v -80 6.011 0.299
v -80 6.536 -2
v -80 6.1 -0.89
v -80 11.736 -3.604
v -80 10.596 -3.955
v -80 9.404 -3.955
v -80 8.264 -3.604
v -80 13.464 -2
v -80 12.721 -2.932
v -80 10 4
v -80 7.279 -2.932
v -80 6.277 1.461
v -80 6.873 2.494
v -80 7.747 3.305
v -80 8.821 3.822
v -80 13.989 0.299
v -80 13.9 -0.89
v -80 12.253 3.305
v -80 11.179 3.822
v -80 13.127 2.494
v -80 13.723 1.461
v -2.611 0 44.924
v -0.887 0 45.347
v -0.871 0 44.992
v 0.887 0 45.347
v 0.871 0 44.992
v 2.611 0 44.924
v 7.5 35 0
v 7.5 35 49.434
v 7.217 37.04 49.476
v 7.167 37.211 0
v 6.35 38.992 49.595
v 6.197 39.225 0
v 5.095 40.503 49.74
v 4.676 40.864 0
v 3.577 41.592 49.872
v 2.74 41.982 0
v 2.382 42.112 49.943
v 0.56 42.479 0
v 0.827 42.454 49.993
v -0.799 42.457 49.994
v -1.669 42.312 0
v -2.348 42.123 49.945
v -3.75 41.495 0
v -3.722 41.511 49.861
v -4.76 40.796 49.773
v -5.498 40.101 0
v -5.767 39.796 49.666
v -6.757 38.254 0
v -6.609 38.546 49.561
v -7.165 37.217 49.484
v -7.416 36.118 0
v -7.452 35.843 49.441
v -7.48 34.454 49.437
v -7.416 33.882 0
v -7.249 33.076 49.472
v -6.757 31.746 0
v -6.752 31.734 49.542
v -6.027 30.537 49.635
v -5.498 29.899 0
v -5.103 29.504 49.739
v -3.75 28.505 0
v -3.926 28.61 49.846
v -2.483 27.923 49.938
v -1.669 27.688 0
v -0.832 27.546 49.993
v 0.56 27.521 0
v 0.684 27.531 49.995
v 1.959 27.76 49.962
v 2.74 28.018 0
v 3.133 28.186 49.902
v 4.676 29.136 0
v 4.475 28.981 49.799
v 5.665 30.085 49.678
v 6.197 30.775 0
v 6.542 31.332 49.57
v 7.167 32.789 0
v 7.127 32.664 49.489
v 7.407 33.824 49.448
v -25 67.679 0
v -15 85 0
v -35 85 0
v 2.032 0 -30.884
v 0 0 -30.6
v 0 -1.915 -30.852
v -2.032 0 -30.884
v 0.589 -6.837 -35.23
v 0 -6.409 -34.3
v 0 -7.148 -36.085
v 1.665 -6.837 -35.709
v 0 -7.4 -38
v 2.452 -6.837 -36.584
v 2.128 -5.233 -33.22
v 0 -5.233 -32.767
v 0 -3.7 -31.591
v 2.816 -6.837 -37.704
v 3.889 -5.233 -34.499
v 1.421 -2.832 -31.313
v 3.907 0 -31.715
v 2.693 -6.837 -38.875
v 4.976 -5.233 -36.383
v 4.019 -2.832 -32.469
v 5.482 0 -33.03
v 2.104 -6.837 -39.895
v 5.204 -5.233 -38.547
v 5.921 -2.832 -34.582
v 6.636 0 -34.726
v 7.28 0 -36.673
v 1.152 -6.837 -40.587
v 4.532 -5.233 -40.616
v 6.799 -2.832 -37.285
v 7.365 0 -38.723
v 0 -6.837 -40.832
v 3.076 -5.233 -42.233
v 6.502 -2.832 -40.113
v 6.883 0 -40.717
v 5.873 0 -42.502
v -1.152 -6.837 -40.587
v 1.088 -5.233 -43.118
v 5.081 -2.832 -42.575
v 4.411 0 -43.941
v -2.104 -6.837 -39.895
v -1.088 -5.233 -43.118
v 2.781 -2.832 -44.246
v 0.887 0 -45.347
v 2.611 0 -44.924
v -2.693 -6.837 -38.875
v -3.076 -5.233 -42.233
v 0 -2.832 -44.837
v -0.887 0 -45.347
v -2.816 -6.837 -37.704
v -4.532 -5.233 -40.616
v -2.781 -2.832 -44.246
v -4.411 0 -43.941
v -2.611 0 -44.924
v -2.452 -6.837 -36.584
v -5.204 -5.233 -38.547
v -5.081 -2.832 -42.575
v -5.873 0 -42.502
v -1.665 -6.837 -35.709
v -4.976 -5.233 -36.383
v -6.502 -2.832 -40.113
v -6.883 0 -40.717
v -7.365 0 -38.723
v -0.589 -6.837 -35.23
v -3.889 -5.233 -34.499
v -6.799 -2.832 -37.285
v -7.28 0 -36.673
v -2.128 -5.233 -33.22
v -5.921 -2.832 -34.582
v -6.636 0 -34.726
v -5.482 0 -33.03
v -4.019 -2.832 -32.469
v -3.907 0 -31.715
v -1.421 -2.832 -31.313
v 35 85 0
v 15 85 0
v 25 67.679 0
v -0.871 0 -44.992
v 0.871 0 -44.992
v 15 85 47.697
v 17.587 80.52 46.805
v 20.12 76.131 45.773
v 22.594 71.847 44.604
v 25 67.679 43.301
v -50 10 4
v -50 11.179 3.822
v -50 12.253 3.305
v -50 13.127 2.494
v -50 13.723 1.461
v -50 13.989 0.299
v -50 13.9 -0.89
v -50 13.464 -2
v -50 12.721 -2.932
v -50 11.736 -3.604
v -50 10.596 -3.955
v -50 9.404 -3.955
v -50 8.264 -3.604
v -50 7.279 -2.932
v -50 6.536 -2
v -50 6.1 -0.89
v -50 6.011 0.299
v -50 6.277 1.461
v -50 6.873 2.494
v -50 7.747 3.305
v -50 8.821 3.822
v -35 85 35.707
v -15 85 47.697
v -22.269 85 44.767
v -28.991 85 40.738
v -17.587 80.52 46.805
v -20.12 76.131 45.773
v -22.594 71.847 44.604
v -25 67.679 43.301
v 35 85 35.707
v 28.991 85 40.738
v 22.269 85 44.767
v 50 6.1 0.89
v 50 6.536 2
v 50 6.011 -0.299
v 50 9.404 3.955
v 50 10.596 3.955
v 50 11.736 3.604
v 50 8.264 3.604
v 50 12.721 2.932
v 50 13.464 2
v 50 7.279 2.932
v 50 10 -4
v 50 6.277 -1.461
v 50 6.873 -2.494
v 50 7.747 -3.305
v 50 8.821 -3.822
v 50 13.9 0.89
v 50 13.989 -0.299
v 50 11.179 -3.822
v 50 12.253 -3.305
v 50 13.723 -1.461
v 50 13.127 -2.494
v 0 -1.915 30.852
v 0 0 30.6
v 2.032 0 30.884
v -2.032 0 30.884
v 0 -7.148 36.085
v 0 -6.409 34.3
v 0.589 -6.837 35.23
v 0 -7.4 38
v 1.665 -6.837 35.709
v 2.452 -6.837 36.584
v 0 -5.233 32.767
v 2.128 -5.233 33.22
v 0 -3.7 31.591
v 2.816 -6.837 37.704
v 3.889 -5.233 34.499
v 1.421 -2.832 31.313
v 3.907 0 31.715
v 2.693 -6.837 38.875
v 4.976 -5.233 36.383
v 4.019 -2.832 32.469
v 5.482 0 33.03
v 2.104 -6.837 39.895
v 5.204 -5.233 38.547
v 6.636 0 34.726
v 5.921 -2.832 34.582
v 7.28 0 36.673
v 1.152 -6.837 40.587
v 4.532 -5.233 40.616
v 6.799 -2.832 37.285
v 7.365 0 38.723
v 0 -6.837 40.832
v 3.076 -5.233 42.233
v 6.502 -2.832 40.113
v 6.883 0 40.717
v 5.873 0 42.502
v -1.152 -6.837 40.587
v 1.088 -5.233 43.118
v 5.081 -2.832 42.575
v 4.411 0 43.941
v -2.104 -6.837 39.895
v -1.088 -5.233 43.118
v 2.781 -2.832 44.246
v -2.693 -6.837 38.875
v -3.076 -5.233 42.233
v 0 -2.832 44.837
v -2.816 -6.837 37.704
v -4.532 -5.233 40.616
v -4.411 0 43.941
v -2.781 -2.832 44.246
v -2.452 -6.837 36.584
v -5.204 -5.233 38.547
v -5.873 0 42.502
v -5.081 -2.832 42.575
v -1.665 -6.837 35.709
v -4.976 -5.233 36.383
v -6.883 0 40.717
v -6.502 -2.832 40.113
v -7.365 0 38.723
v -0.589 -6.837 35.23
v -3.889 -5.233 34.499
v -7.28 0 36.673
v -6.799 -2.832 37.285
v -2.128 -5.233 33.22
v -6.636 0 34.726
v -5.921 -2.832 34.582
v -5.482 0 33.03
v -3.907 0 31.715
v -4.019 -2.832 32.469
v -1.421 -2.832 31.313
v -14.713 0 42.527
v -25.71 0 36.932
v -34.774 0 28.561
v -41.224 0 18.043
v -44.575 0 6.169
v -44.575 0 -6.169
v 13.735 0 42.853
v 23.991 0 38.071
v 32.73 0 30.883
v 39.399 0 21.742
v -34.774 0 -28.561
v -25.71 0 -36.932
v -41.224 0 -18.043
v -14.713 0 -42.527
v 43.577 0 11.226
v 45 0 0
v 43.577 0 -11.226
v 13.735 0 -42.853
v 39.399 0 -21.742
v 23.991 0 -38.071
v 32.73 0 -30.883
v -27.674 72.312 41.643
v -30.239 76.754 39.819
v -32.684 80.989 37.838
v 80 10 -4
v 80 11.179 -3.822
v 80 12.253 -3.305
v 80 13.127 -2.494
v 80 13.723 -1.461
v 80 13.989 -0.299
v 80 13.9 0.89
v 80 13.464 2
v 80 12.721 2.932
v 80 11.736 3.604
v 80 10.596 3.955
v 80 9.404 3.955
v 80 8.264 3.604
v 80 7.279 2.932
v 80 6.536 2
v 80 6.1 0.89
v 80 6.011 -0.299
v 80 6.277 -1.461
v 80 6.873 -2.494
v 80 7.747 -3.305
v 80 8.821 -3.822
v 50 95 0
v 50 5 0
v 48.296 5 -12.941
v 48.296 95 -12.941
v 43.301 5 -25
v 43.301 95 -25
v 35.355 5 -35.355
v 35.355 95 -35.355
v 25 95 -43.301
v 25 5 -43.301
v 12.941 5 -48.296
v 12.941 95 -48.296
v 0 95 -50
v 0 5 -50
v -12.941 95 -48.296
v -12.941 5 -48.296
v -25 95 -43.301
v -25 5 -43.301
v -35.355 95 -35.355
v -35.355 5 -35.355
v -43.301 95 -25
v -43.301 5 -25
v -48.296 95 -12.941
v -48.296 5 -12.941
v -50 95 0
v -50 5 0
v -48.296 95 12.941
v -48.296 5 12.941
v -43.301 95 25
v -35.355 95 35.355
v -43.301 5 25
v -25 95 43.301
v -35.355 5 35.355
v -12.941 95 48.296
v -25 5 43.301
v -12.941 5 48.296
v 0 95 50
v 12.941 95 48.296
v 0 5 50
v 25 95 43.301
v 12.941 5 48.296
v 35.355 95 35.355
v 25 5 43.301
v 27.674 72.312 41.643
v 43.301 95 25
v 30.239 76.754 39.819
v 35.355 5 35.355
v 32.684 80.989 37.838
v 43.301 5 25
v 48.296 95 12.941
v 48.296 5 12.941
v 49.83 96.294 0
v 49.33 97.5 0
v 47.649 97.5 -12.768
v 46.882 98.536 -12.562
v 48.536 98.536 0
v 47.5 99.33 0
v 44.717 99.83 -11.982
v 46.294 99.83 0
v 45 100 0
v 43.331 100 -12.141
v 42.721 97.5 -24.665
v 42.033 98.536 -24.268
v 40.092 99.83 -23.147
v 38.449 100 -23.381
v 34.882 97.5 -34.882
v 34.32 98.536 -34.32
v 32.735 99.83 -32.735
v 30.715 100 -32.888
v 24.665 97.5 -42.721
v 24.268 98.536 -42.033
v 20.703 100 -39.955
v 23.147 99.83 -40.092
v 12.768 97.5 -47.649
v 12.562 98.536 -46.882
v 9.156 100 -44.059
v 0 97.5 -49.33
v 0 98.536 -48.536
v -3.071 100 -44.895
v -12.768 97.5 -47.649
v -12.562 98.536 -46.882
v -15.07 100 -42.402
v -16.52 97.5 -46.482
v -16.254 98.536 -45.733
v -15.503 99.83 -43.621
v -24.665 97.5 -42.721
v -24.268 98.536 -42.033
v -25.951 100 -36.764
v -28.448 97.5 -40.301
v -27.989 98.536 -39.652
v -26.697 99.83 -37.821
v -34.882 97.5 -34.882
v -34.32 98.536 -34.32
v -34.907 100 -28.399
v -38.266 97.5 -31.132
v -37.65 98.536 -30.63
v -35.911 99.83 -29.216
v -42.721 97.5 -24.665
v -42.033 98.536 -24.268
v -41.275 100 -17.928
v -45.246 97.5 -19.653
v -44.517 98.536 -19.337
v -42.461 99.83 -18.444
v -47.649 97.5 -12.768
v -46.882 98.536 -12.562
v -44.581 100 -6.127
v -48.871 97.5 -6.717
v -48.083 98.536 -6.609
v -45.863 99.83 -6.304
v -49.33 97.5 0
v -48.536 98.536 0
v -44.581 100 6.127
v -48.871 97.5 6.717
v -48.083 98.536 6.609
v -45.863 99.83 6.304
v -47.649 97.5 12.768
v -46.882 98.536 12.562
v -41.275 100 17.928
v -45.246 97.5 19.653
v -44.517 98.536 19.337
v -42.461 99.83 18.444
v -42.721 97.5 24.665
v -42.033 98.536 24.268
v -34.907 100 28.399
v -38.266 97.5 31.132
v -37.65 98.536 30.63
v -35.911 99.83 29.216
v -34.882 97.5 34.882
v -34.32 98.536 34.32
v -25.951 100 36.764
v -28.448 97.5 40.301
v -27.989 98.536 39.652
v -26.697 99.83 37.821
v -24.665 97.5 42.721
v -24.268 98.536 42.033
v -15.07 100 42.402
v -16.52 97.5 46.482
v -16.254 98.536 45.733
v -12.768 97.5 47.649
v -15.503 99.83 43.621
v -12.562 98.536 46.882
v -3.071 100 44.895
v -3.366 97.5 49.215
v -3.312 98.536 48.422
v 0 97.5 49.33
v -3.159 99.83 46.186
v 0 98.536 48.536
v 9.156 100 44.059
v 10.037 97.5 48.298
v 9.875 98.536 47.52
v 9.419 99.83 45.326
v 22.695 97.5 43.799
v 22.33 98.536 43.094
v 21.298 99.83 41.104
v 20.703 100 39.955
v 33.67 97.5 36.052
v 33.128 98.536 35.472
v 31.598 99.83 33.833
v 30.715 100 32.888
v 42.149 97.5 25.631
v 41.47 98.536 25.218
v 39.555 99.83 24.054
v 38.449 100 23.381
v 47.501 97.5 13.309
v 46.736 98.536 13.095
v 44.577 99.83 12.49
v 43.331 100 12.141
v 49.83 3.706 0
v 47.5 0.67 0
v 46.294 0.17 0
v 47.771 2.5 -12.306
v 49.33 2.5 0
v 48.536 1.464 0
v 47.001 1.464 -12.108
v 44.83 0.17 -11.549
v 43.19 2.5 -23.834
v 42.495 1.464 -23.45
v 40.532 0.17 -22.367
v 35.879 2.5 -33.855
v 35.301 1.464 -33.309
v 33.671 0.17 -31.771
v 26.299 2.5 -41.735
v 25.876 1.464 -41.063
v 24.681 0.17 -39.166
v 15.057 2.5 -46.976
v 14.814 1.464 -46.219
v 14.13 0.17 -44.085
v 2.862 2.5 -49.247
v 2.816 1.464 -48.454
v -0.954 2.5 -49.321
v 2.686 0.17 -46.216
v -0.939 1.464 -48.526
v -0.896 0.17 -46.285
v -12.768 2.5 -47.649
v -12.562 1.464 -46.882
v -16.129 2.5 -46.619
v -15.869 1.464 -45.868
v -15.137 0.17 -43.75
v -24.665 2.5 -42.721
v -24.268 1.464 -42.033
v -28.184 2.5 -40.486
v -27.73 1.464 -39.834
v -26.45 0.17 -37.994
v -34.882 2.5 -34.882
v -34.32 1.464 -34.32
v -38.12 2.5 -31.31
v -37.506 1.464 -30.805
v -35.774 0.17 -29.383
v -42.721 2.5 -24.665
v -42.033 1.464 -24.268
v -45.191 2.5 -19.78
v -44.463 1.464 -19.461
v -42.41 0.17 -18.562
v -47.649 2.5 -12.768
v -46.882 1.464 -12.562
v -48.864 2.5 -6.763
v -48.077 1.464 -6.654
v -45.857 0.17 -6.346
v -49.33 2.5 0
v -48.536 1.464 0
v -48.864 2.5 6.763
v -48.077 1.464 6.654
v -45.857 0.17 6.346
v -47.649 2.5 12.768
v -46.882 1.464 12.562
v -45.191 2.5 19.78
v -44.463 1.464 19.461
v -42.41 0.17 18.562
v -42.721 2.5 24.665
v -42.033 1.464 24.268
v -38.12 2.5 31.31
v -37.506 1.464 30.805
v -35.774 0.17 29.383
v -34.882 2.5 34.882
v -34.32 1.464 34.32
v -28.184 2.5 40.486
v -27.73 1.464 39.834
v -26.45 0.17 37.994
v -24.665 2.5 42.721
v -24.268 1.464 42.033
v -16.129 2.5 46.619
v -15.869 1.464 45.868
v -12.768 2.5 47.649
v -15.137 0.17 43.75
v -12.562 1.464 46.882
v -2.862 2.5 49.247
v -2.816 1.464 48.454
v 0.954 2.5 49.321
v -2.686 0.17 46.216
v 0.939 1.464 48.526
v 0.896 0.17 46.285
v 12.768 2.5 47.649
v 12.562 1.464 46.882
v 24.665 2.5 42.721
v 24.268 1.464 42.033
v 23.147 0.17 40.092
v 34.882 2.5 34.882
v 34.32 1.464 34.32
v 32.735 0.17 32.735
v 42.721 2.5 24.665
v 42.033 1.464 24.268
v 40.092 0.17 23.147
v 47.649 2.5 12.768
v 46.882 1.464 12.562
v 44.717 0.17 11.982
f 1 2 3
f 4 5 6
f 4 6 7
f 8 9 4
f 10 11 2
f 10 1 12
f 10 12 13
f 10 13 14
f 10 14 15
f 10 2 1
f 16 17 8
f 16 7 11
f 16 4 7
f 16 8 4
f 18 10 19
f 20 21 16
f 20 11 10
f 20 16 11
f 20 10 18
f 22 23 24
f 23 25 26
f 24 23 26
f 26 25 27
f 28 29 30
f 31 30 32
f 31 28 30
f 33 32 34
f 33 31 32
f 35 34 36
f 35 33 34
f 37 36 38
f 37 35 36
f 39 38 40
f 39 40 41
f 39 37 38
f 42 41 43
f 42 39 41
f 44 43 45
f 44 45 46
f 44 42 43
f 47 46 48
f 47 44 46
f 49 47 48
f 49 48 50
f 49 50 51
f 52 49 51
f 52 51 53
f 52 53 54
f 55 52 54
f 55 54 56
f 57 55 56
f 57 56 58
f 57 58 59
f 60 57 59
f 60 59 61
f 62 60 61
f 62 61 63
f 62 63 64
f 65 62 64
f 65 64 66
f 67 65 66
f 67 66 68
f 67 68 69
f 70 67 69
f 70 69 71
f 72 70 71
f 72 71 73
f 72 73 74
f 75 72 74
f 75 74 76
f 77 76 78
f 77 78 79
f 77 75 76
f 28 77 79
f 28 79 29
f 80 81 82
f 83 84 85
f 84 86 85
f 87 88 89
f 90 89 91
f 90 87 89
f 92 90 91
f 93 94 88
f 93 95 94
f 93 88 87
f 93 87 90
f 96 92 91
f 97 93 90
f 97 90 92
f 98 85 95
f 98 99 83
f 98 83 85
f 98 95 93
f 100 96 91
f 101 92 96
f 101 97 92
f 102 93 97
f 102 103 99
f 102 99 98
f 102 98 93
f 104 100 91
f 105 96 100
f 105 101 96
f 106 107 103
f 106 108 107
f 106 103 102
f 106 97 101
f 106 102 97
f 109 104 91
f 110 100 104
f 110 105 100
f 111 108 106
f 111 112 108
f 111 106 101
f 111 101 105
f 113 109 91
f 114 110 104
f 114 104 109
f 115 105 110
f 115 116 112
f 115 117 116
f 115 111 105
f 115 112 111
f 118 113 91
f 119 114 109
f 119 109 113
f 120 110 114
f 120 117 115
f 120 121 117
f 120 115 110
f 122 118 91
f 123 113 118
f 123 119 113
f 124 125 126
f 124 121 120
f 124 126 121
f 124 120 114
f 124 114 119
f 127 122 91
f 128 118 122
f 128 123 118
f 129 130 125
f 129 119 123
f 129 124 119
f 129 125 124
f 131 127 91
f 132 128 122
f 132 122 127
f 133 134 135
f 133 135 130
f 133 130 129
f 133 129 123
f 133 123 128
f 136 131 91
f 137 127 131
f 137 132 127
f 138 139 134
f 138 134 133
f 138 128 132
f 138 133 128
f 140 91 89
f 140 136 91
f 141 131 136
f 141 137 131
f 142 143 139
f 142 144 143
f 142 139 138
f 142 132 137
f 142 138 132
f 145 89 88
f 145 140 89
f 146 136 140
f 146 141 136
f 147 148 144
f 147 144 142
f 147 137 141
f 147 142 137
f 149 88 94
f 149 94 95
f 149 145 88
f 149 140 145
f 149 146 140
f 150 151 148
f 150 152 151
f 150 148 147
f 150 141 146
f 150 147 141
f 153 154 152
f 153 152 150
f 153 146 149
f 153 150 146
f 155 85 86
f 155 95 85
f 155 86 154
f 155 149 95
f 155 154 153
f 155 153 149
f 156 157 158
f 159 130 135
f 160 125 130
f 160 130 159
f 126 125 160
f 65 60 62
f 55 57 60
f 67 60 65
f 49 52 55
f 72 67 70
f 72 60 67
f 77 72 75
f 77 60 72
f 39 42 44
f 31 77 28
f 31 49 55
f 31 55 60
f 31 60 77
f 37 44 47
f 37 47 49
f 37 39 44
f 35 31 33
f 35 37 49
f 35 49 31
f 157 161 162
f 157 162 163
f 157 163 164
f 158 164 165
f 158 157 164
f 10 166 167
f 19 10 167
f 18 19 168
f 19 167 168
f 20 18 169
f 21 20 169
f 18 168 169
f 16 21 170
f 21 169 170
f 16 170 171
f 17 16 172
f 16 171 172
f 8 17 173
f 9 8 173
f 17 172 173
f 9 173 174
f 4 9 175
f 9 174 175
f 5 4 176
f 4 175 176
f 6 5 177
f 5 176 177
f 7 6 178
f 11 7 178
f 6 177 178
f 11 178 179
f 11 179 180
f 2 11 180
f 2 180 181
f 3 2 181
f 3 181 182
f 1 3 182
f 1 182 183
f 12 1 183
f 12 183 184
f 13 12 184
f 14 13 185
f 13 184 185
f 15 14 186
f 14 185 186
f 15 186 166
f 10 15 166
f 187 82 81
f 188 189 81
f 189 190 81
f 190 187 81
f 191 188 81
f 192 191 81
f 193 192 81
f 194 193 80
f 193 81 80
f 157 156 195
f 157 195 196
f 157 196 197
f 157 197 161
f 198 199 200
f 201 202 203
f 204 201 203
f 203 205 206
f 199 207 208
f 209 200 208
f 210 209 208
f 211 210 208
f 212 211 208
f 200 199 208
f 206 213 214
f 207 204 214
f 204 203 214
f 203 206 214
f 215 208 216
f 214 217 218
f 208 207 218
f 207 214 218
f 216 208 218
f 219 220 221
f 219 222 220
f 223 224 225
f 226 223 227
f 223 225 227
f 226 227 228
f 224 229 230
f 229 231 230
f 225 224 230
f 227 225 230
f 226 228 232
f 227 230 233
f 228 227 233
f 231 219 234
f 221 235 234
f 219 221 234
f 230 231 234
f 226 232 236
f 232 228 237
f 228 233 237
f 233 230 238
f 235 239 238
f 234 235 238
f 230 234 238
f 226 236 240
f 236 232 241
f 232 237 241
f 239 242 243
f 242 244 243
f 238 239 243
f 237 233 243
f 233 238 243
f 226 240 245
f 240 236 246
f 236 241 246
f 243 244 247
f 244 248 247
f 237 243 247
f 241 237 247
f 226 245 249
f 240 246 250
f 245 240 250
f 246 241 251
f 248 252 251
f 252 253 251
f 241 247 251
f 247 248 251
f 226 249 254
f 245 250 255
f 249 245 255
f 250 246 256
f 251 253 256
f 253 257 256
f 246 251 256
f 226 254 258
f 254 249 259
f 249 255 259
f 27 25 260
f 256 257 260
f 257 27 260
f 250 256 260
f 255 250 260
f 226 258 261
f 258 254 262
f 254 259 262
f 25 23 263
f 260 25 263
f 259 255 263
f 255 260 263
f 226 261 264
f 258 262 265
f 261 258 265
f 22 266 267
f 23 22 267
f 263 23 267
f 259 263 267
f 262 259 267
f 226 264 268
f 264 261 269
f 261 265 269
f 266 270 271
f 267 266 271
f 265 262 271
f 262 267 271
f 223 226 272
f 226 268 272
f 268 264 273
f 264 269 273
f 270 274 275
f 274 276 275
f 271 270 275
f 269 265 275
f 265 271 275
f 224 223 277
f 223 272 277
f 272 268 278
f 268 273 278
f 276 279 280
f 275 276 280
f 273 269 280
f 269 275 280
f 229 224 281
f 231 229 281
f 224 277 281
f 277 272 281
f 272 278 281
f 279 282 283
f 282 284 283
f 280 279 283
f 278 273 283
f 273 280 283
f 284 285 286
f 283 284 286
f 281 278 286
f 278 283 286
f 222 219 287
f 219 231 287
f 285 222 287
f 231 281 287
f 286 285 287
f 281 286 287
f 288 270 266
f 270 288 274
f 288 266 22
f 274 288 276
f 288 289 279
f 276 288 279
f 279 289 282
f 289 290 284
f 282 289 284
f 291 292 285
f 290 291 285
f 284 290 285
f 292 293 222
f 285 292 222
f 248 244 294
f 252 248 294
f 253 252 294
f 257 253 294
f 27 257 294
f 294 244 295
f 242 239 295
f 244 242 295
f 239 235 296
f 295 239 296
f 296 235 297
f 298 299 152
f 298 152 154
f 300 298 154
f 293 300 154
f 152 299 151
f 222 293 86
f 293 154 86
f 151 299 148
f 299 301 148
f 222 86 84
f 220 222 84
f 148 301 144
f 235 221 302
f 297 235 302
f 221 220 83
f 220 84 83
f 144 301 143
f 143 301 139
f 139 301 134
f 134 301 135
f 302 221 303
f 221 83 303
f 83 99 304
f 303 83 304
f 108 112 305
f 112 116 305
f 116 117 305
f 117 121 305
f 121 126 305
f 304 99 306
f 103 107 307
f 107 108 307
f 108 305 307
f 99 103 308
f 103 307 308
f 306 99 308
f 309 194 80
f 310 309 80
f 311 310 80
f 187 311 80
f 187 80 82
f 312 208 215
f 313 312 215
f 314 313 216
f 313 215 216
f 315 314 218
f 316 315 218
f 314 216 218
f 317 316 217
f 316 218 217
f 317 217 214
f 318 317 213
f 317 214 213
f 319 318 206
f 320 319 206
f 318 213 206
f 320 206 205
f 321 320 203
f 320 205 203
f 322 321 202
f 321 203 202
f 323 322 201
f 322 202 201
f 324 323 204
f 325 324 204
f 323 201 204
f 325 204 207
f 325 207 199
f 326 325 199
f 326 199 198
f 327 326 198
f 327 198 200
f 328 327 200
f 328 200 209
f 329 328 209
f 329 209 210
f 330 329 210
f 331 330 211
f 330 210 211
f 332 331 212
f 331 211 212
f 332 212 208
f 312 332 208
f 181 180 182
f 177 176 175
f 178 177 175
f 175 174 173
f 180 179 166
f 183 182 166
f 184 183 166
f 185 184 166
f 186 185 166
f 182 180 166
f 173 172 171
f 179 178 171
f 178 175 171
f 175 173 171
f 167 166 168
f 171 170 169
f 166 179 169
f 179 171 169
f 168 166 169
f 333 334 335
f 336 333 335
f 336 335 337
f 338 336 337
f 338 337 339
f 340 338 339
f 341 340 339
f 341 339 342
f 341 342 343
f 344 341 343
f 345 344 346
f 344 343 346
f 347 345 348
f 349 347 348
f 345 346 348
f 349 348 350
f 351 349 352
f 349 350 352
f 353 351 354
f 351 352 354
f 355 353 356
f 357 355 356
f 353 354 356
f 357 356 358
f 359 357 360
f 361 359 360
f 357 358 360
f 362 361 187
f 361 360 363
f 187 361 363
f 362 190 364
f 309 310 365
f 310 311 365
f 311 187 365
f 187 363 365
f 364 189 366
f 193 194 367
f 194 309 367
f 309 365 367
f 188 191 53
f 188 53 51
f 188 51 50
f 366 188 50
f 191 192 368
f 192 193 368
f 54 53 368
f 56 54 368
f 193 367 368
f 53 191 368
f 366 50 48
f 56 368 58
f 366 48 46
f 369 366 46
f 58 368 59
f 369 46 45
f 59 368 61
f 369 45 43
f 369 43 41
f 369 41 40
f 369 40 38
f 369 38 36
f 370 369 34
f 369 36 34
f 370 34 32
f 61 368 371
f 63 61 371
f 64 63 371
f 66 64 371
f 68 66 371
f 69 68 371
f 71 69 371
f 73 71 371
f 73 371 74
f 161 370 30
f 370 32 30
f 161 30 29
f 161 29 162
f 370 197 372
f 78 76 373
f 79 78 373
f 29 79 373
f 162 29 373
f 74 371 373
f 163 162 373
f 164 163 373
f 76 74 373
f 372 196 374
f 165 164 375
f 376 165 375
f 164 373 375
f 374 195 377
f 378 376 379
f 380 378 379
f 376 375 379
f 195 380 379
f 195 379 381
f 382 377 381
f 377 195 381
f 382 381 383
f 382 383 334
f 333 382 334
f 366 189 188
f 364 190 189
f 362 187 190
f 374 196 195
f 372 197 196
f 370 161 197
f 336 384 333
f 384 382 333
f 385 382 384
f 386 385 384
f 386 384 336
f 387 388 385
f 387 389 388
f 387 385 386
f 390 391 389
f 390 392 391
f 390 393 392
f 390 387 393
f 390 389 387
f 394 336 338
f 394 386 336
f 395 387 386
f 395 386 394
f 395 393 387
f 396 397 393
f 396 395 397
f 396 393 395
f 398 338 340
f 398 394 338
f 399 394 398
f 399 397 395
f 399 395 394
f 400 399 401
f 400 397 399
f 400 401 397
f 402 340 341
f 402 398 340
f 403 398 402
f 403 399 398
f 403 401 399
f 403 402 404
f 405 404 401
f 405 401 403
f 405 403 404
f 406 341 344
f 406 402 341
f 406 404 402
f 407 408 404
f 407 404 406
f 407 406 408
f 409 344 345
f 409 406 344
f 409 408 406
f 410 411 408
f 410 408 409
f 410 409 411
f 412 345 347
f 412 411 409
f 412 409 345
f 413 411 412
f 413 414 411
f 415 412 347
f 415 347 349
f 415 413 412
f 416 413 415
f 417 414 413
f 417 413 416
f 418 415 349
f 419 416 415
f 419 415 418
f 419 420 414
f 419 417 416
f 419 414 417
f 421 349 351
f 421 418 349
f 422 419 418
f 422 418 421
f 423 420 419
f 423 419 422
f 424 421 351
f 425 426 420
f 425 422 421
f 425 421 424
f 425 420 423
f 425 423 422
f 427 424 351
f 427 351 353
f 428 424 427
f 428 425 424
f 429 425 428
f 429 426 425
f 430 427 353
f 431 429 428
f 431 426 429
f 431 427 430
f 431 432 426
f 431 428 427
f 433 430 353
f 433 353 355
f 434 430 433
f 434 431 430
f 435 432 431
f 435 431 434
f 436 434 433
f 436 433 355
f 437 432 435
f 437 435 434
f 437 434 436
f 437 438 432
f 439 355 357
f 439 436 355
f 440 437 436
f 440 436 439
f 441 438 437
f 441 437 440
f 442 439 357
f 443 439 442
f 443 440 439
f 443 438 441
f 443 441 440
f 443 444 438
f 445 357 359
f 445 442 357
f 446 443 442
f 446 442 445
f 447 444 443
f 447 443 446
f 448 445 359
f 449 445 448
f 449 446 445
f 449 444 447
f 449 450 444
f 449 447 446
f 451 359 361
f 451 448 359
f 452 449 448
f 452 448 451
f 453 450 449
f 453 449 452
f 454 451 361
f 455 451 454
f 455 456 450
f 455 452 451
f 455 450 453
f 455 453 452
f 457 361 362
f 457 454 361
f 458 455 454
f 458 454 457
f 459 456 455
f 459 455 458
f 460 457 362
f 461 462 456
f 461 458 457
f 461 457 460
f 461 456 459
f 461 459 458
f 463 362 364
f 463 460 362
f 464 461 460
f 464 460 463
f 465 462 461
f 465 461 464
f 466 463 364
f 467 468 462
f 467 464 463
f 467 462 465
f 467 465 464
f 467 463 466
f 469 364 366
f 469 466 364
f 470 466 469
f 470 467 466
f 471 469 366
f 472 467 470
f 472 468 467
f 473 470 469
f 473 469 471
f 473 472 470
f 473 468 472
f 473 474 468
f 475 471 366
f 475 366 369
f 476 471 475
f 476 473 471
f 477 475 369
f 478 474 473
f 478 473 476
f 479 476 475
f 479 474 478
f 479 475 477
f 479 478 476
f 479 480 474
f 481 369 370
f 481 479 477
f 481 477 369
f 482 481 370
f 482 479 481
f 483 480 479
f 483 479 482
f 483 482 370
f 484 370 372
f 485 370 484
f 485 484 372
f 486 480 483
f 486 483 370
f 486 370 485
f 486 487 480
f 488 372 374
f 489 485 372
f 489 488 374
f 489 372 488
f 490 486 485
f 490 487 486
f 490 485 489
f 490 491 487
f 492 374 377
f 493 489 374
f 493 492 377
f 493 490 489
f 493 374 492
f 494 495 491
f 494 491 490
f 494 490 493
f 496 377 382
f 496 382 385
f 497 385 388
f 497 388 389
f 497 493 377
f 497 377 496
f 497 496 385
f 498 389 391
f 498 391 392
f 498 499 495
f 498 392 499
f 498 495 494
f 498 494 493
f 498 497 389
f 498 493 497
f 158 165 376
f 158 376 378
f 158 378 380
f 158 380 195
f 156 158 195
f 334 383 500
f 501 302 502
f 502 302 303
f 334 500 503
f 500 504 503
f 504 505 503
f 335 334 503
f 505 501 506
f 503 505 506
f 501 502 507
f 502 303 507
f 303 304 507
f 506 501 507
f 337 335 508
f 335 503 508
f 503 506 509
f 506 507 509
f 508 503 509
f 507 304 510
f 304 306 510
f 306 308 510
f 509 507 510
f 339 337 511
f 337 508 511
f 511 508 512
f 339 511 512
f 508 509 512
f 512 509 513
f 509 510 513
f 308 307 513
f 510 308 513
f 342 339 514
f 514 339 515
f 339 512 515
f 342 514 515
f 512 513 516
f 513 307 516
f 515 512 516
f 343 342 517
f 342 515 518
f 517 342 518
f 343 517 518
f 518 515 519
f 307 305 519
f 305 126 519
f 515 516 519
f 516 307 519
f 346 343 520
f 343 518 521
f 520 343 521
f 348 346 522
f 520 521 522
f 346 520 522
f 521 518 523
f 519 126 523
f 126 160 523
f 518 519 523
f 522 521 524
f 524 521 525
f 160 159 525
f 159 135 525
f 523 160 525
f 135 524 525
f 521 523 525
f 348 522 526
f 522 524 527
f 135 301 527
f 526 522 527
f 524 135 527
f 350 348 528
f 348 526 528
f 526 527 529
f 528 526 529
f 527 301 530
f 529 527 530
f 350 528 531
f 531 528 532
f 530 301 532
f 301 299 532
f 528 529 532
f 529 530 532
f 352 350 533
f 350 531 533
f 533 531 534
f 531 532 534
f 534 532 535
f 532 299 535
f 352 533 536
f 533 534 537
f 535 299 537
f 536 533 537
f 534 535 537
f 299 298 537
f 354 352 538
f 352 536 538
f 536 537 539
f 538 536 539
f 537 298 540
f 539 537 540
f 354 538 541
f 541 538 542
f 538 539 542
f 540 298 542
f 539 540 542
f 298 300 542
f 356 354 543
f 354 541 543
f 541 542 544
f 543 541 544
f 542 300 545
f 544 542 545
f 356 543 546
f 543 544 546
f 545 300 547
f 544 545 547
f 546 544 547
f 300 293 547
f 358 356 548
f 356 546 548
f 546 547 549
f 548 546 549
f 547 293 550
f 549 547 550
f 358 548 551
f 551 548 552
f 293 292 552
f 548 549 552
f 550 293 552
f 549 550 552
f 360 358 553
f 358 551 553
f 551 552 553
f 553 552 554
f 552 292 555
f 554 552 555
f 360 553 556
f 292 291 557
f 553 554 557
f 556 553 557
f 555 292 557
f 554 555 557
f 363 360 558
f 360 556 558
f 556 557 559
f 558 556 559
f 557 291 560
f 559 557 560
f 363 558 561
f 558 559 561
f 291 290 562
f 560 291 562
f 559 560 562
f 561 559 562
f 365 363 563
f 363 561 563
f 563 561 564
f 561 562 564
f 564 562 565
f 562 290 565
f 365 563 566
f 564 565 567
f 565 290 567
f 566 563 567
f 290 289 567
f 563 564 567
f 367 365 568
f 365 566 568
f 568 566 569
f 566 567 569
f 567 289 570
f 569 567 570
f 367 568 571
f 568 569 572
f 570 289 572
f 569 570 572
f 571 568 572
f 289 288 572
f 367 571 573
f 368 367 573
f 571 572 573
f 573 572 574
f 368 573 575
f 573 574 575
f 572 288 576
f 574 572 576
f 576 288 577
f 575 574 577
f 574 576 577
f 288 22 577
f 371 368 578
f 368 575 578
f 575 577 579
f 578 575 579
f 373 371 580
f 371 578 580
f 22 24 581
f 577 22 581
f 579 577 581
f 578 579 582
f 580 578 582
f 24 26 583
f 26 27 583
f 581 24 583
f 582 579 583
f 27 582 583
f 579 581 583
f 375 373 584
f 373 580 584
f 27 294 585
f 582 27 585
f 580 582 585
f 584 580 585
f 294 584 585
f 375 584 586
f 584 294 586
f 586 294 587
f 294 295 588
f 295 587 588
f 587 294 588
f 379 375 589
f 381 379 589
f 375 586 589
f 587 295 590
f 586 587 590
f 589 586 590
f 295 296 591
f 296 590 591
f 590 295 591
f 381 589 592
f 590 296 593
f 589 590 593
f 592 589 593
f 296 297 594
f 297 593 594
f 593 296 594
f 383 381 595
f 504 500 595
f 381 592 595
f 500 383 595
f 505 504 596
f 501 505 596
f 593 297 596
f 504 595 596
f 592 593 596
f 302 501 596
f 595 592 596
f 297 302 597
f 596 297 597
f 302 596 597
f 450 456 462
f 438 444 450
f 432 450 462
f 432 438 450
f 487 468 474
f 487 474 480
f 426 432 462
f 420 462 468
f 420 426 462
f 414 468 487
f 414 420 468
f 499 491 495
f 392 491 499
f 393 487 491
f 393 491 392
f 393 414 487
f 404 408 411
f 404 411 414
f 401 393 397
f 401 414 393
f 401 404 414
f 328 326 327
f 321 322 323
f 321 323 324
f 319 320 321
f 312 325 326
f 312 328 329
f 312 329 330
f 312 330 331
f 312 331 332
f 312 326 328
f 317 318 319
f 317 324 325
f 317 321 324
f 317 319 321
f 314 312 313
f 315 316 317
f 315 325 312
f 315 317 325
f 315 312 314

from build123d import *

# Parameters (mm, degrees)
ESQUISSE1_R             = 50
BOSS_EXTRU_1_DEPTH      = 100
ESQUISSE2_R             = 4
BOSS_EXTRU_2_DEPTH      = 30
ESQUISSE3_R             = 4
BOSS_EXTRU_3_DEPTH      = 30
CONG_1_R                = 5
ESQUISSE6_R             = 7.5
ENL_V_MAT_EXTRU_1_DEPTH = 65


with BuildPart() as part:
    # Esquisse1 → Boss.-Extru.1 (new body)
    with BuildSketch(Plane(origin=(0, 0, 0), x_dir=(1, 0, 0), z_dir=(0, 1, 0))):
        Circle(ESQUISSE1_R)
    extrude(amount=BOSS_EXTRU_1_DEPTH)

    # Congé1
    cong_1_edges = [part.edges().sort_by_distance(p)[0] for p in [
        (-50, 0, 0),
        (-50, 100, 0),
    ]]
    fillet(cong_1_edges, radius=CONG_1_R)

    # Esquisse5 → Révolution1 (revolve)
    with BuildSketch(Plane(origin=(0, 0, 0), x_dir=(0, 0, -1), z_dir=(1, 0, 0))):
        with BuildLine():
            Line((-38, 0), (-38, -7.4))
            ThreePointArc((-38, -7.4), (-32.767409819, -5.232590181), (-30.6, 0))
            Line((-30.6, 0), (-38, 0))
        make_face()
    r_volution1 = revolve(axis=Axis((0, 0, 38), (0, -1, 0)))

    # Symétrie4: Révolution1 across plane
    add(r_volution1.mirror(Plane.XY))

    # Esquisse6 → Enlèv. mat.-Extru.1 (cut)
    with BuildSketch(Plane.XY):
        with Locations((0, 35)):
            Circle(ESQUISSE6_R)
        Polygon((-35, 85), (-15, 85), (-25, 67.679491924), align=None)
        Polygon((25, 67.679491924), (35, 85), (15, 85), align=None)
    extrude(amount=ENL_V_MAT_EXTRU_1_DEPTH, mode=Mode.SUBTRACT)


with BuildPart() as body_2:
    # Esquisse2 → Boss.-Extru.2 (new body)
    with BuildSketch(Plane(origin=(50, 0, 0), x_dir=(0, 0, -1), z_dir=(1, 0, 0))):
        with Locations((0, 10)):
            Circle(ESQUISSE2_R)
    extrude(amount=BOSS_EXTRU_2_DEPTH)


with BuildPart() as body_3:
    # Esquisse3 → Boss.-Extru.3 (new body)
    with BuildSketch(Plane.ZY.offset(50)):
        with Locations((0, 10)):
            Circle(ESQUISSE3_R)
    extrude(amount=BOSS_EXTRU_3_DEPTH)


solid = Compound([part.part, body_2.part, body_3.part])
